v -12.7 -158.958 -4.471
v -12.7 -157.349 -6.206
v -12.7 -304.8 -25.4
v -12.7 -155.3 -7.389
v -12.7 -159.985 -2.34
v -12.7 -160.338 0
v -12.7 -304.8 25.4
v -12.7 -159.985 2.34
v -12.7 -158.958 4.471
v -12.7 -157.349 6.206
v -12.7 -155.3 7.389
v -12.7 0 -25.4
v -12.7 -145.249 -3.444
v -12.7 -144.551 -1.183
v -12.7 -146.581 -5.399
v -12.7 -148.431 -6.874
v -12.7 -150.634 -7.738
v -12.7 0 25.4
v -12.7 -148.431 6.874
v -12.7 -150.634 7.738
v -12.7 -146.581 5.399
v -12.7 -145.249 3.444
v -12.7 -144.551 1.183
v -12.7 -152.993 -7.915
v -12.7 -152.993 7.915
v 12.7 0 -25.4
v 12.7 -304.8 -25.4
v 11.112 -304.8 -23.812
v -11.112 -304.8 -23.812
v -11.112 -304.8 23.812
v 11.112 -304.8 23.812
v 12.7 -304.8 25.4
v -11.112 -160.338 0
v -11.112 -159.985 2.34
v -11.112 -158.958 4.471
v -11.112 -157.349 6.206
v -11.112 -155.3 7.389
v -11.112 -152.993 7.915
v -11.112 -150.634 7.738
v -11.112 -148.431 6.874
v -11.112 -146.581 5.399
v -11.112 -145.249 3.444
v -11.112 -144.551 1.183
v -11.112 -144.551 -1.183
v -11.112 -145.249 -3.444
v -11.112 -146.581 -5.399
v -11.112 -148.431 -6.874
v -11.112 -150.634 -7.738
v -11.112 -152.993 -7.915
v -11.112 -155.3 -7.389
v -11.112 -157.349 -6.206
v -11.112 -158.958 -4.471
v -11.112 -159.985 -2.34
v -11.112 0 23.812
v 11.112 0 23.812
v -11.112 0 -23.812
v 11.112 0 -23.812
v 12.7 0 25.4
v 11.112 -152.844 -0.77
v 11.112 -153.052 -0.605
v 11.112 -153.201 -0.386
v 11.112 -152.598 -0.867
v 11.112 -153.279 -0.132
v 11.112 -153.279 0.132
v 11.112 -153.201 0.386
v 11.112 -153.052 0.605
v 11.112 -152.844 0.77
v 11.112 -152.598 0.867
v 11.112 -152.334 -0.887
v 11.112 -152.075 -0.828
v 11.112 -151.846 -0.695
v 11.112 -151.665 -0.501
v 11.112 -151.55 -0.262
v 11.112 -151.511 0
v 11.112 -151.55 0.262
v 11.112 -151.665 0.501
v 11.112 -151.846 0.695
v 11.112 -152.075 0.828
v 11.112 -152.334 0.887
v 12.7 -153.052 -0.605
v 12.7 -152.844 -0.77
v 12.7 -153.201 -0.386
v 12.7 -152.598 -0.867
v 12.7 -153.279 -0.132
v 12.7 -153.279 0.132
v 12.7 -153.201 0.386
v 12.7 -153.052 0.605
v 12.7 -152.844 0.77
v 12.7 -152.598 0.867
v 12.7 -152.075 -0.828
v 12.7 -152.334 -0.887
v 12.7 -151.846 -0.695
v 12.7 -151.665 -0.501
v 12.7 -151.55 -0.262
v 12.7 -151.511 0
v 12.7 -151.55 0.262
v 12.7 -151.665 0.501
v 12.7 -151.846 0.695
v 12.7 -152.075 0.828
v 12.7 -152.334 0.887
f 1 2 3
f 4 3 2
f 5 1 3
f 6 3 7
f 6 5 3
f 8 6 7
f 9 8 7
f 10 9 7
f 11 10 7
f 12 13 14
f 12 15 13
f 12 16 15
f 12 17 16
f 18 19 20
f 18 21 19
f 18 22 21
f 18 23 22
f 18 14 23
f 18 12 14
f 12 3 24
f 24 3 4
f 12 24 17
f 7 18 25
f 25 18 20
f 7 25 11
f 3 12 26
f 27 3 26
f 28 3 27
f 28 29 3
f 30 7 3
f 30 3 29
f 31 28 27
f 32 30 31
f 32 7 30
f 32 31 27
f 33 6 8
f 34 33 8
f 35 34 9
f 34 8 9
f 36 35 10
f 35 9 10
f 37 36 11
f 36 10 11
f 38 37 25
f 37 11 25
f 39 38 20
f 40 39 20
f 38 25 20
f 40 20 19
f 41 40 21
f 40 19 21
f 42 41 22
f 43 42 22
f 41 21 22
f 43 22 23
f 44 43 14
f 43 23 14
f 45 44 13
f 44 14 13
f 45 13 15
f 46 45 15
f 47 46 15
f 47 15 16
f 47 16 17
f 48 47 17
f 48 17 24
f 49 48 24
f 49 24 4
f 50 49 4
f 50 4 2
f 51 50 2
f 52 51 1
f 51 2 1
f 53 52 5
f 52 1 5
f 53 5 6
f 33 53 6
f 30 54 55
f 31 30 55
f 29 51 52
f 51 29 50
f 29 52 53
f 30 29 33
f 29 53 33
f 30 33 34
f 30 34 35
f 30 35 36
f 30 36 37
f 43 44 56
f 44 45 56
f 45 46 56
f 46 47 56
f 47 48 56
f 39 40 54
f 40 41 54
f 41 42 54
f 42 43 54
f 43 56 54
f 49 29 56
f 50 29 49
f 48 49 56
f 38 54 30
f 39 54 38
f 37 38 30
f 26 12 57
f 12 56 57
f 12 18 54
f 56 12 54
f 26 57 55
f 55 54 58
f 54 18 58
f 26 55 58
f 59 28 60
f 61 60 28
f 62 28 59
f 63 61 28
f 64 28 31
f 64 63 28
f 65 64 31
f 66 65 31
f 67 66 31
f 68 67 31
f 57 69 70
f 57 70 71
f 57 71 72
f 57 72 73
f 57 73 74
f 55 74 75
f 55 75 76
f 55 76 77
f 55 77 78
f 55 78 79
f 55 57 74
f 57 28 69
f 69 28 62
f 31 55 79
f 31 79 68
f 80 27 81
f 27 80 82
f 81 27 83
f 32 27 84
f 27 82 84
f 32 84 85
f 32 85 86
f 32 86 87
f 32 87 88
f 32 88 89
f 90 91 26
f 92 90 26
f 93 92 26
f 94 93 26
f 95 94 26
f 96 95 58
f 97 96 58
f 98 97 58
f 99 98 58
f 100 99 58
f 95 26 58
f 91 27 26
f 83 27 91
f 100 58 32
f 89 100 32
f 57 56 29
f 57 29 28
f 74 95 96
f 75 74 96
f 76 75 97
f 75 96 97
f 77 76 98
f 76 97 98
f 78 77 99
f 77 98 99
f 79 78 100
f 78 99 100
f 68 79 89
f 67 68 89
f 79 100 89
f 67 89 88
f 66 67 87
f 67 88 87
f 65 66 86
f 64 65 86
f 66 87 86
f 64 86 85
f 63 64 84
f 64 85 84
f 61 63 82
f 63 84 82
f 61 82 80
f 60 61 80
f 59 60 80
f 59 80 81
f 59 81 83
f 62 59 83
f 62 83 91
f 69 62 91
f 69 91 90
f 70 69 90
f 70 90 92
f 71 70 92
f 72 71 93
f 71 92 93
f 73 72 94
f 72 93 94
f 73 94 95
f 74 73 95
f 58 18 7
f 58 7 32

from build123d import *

# Parameters (mm, degrees)
F0_W     = 25.4
F0_H     = 50.8
F0_W_2   = 22.225
F0_H_2   = 47.625
F1_DEPTH = 304.8
F2_R     = 7.9375
F3_DEPTH = 1.5875
F4_R     = 0.889
F5_DEPTH = 1.5875


with BuildPart() as f1:
    # F0 (on Front) → F1 (new body)
    with BuildSketch(Plane.XZ):
        Rectangle(F0_W, F0_H)
        Rectangle(F0_W_2, F0_H_2, mode=Mode.SUBTRACT)
    extrude(amount=F1_DEPTH)

    # F2 (on face) → F3 (cut)
    with BuildSketch(Plane(origin=(-12.7, 0, 0), x_dir=(0, -1, 0), z_dir=(-1, 0, 0))):
        with Locations((152.4, 0)):
            Circle(F2_R)
    extrude(amount=-F3_DEPTH, mode=Mode.SUBTRACT)

    # F4 (on face) → F5 (cut)
    with BuildSketch(Plane.YZ.offset(12.7)):
        with Locations((-152.4, 0)):
            Circle(F4_R)
    extrude(amount=-F5_DEPTH, mode=Mode.SUBTRACT)


solid = f1.part
